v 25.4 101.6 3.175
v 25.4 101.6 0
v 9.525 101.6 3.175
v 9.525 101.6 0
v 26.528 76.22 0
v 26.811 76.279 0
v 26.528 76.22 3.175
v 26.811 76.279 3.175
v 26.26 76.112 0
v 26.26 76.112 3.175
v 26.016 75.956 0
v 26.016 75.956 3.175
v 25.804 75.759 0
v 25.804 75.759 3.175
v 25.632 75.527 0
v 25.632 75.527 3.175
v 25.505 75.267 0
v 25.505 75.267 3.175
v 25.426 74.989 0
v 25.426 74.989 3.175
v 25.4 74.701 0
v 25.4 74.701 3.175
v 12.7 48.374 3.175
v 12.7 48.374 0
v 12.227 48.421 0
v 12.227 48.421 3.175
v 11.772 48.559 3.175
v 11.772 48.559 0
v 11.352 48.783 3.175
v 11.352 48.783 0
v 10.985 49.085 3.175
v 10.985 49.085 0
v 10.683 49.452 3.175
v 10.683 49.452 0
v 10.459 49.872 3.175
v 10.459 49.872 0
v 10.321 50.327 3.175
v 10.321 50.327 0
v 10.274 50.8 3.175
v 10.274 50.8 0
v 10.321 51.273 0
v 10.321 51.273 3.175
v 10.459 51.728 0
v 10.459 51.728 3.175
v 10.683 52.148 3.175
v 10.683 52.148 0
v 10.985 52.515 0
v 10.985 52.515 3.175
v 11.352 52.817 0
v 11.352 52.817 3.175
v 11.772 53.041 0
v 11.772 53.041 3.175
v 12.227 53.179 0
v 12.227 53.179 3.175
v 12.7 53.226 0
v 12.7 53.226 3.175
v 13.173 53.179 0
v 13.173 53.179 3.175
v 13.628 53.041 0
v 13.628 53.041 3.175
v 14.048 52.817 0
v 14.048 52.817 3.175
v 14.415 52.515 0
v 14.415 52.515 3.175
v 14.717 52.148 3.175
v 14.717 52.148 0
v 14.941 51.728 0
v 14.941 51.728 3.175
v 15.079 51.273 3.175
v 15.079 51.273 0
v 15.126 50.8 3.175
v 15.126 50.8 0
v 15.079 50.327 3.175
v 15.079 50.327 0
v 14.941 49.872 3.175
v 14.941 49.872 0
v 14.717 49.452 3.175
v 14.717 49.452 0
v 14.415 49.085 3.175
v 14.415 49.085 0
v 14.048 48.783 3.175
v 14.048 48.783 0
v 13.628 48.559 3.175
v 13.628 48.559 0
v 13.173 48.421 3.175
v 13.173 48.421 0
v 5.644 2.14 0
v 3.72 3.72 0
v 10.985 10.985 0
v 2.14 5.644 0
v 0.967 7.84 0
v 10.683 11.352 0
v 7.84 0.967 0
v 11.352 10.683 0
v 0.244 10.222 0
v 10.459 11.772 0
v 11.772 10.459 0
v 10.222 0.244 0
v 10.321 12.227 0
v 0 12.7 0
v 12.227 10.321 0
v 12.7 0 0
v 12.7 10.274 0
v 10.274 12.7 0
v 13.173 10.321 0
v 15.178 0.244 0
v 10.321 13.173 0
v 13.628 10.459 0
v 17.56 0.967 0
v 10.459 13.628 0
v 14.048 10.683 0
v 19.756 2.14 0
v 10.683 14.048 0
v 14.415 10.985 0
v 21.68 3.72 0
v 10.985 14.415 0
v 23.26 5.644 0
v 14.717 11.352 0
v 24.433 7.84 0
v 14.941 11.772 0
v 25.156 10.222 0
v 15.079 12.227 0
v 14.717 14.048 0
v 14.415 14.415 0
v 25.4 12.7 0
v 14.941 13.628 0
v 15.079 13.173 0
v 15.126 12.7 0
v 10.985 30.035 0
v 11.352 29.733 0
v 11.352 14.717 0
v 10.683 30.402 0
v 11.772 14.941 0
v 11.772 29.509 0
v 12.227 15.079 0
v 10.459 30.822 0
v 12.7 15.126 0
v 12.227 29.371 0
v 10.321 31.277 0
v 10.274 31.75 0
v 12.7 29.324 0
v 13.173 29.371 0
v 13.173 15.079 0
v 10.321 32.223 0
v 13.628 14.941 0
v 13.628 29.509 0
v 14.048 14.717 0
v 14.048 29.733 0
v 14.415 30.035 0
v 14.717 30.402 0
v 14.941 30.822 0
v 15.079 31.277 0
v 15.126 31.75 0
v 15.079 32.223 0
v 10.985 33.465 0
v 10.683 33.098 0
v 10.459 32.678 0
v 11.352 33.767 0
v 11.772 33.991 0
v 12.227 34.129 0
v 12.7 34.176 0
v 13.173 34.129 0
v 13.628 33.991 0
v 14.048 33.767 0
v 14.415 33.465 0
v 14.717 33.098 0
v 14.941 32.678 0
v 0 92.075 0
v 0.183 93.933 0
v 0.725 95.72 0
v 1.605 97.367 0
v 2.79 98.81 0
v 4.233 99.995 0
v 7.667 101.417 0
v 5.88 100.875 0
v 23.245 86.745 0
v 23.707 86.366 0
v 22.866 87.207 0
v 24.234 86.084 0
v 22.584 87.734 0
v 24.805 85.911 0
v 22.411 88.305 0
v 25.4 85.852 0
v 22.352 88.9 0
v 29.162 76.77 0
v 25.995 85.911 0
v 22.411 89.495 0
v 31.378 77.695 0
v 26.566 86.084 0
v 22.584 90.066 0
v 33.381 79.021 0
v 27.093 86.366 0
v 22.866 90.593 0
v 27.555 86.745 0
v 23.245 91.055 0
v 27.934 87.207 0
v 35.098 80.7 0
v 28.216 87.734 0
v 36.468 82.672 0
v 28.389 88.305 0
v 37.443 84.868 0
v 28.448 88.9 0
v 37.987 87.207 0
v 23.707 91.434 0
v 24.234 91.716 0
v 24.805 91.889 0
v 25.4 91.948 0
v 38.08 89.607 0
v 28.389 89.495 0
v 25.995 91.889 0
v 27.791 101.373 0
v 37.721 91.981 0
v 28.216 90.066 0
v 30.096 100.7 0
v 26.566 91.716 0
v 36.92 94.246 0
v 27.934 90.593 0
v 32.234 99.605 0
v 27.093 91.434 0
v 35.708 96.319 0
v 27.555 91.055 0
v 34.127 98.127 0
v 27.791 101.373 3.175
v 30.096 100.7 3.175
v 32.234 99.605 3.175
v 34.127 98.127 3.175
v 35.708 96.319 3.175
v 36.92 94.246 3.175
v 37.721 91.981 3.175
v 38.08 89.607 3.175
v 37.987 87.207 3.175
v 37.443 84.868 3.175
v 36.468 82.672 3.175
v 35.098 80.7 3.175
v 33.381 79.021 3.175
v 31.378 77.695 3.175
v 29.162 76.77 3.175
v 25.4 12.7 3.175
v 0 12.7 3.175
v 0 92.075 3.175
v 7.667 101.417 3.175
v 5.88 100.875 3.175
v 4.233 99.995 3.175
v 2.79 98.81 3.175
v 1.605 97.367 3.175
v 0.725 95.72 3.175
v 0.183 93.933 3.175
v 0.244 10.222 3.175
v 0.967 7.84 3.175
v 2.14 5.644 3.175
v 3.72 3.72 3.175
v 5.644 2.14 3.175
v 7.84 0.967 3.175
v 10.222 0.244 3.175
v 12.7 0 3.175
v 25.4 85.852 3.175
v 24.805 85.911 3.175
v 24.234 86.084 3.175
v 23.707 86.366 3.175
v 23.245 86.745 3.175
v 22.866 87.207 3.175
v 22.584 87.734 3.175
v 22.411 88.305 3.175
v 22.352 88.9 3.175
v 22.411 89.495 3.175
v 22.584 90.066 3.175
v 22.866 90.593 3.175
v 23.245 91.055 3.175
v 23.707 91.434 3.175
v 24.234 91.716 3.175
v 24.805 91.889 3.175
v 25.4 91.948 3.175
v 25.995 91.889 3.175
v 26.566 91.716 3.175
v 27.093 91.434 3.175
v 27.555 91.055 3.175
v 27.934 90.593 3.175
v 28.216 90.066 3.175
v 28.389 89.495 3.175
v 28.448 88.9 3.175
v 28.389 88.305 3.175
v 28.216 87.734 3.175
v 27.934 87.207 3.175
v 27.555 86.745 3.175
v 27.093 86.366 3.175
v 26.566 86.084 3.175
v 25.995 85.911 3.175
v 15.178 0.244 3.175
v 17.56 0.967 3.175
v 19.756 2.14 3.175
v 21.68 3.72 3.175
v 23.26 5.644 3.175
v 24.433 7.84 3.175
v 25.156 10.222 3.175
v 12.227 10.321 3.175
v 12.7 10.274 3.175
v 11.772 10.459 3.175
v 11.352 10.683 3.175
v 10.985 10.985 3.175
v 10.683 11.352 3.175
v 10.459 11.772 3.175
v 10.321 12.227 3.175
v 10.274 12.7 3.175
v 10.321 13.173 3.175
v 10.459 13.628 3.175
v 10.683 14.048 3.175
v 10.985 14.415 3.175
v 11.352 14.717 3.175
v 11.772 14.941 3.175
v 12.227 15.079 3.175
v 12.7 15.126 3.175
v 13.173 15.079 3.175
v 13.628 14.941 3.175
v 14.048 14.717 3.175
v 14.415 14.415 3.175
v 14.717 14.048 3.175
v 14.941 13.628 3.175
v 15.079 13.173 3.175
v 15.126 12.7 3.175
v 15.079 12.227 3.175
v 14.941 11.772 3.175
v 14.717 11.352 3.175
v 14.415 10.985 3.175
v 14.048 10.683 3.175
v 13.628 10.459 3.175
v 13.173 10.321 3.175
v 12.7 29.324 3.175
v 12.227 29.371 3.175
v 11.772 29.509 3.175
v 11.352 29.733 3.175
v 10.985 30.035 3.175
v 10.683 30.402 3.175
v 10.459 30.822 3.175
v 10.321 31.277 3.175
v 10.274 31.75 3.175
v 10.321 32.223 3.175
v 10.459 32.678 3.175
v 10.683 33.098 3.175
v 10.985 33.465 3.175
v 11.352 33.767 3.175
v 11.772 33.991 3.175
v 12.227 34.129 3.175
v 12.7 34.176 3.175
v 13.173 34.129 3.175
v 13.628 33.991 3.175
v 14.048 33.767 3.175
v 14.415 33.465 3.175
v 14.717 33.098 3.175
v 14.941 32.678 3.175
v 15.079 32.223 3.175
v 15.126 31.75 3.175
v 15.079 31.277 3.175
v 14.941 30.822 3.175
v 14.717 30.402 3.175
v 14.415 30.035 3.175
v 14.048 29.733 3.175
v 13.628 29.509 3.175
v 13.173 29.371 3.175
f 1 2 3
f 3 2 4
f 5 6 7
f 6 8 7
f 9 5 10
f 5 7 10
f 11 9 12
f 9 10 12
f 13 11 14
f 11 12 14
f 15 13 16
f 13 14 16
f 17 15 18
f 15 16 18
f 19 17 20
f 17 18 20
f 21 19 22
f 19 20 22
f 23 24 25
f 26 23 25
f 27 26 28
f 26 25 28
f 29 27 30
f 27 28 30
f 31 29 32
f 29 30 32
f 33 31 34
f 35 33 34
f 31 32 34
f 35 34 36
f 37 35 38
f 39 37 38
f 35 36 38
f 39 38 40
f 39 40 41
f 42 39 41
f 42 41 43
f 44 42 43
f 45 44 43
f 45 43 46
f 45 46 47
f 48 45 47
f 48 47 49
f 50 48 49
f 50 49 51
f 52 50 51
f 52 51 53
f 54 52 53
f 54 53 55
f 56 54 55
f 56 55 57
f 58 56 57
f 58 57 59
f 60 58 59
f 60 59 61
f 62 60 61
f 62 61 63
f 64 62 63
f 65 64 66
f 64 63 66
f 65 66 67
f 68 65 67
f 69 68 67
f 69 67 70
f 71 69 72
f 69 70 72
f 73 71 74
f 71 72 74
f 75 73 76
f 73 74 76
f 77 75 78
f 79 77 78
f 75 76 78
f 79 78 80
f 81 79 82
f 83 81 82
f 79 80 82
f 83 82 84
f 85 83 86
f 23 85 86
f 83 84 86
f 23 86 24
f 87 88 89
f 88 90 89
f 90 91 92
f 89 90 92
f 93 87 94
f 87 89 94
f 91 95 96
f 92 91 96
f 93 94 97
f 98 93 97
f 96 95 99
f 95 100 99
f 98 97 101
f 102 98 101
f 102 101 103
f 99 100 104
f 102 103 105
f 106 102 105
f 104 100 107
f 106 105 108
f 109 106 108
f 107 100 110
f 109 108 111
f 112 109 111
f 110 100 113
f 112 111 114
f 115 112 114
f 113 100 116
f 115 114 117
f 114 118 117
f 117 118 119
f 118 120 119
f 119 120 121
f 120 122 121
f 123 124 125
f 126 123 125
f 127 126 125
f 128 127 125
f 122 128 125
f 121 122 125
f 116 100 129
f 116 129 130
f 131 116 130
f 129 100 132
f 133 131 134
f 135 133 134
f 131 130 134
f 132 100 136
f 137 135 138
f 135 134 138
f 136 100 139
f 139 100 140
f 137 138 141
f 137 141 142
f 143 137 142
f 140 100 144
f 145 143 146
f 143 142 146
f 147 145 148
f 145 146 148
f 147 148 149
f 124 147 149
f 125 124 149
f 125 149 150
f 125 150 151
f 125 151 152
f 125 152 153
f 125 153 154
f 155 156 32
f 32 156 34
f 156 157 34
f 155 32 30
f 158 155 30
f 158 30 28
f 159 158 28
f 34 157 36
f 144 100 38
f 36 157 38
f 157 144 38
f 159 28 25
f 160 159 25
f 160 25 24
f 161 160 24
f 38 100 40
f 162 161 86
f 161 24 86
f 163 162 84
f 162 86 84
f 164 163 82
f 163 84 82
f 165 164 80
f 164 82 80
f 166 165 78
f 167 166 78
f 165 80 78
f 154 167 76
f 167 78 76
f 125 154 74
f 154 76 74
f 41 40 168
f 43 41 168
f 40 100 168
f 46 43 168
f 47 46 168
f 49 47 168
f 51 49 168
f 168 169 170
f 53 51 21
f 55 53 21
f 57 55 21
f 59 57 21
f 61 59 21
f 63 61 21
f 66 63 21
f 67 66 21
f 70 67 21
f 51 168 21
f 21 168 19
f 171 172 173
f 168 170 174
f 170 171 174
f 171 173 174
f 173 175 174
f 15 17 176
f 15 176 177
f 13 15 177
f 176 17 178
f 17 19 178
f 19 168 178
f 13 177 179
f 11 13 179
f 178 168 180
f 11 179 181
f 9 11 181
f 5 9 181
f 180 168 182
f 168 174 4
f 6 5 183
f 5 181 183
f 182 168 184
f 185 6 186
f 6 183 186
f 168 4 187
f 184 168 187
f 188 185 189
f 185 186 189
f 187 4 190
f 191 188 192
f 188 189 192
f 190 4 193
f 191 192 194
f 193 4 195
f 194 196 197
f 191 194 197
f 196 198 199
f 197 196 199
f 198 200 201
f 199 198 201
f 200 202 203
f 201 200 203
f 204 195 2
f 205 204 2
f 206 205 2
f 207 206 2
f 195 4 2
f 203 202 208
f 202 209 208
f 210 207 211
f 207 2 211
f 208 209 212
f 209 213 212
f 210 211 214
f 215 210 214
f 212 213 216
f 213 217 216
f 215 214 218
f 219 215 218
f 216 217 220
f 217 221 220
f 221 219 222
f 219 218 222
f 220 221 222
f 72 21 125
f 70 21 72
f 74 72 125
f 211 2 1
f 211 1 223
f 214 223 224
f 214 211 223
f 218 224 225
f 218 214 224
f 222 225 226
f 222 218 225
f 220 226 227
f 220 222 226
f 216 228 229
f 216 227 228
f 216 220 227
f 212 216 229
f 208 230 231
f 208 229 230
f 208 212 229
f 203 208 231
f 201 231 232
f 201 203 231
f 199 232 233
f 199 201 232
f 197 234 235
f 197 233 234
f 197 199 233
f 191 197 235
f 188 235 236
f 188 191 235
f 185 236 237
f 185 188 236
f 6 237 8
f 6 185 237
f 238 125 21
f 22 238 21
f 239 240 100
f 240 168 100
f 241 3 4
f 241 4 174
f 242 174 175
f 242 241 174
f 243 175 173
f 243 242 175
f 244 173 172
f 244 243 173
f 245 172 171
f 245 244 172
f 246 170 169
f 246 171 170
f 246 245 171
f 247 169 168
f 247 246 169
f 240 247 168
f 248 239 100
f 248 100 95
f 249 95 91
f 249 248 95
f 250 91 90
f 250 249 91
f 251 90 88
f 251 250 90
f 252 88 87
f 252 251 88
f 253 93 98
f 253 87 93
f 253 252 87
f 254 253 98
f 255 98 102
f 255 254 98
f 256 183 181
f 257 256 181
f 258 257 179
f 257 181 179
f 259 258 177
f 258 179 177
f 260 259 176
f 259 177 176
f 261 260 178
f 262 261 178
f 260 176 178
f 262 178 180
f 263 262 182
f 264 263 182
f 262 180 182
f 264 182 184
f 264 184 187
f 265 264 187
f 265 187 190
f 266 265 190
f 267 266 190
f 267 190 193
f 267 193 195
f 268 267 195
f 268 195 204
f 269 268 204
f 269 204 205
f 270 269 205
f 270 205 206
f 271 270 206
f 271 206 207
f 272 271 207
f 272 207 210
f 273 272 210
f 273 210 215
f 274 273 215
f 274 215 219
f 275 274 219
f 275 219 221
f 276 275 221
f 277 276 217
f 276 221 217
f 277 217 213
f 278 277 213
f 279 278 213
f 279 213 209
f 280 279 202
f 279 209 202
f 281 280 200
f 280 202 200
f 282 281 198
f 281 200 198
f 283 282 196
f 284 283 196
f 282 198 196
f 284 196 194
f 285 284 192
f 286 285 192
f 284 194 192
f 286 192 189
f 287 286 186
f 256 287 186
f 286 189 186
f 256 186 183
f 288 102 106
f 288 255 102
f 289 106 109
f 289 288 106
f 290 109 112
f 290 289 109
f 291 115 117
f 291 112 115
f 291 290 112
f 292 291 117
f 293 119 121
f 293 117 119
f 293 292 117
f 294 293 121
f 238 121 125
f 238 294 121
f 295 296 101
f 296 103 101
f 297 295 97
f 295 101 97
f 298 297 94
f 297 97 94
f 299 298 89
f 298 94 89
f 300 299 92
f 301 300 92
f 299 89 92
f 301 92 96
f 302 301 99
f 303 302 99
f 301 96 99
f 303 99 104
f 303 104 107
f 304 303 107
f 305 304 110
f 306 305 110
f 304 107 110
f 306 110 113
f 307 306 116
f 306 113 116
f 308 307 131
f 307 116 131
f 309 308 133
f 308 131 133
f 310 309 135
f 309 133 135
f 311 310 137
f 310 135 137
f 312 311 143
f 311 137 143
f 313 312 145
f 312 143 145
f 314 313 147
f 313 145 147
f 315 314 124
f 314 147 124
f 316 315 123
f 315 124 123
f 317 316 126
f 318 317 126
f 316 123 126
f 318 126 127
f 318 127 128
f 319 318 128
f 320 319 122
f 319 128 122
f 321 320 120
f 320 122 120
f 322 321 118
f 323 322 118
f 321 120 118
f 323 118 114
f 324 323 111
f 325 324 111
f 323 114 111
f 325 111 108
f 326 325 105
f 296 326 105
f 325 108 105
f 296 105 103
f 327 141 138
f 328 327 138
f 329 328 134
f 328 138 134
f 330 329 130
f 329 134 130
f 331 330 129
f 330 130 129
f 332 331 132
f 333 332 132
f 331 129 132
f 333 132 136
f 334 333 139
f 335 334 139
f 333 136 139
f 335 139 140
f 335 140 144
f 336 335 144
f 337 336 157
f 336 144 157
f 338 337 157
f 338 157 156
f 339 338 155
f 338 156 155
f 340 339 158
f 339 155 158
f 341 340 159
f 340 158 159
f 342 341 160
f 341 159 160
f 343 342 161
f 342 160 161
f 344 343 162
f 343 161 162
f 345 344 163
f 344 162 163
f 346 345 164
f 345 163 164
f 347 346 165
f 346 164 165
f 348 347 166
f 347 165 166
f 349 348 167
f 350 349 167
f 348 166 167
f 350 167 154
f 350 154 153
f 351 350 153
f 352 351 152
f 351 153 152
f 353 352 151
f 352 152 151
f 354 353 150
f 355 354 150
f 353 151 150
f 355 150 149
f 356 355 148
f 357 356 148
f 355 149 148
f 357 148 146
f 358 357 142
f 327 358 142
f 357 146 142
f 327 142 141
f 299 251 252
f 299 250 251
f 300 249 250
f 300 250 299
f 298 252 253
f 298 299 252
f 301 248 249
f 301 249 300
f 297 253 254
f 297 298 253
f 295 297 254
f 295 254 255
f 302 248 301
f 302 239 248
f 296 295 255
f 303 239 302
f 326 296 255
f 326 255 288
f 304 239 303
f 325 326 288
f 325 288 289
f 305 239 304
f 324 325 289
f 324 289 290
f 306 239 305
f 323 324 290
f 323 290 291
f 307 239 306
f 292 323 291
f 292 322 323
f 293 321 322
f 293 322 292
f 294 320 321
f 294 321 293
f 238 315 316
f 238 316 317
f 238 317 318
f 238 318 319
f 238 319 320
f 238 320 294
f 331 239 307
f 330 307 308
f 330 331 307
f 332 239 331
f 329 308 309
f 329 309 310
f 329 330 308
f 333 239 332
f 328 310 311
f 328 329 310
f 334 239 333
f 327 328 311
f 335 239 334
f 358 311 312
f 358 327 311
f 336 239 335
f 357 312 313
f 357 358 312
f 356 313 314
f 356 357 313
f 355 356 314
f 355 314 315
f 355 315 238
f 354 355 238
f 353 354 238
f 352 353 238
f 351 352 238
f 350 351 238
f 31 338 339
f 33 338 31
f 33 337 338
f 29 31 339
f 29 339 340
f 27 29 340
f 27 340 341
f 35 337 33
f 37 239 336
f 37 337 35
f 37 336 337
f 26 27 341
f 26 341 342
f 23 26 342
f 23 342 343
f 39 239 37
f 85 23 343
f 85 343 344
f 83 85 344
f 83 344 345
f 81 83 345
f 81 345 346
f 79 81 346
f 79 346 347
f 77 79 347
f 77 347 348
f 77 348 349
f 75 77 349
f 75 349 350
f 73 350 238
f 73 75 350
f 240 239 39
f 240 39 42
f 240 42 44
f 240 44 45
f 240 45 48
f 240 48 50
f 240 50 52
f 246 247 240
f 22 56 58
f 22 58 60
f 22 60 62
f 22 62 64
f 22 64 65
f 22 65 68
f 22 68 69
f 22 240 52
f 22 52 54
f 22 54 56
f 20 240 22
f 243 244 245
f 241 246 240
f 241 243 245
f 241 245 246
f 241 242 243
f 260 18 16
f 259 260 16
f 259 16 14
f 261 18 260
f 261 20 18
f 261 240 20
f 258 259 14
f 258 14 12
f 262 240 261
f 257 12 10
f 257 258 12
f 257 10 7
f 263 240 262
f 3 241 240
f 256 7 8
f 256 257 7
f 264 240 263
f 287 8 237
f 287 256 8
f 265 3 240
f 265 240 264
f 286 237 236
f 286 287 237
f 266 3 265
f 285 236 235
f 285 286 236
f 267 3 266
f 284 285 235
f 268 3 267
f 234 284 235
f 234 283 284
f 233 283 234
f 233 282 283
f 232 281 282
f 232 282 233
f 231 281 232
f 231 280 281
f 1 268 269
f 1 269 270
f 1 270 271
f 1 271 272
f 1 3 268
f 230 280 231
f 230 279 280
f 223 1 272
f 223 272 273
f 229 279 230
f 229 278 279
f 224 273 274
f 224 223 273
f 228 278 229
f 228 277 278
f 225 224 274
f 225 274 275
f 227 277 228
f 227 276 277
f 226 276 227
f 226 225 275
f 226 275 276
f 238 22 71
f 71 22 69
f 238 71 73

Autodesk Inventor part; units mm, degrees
ref_plane "YZ Plane" through (0, 0, 0) normal (1, 0, 0) x (0, 1, 0)
ref_plane "XZ Plane" through (0, 0, 0) normal (0, 1, 0) x (-1, 0, 0)
ref_plane "XY Plane" through (0, 0, 0) normal (0, 0, 1) x (1, 0, 0)
sketch "Sketch1" plane through (0, 0, 0) normal (0, 0, 1) x (1, 0, 0)
  line L0 (0, 0) -> (25.4, 0)
  line L1 (25.4, 0) -> (25.4, 101.6)
  line L2 (25.4, 101.6) -> (0, 101.6)
  line L3 (0, 101.6) -> (0, 0)
  arc A0 (25.4, 76.2) -> (25.4, 101.6) centre (25.4, 88.9) ccw
  dimension "d0" = 101.6
  dimension "d1" = 25.4
  dimension "d2" = 25.4
extrude "Extrusion1" add sketch "Sketch1" along normal blind 3.175
sketch "Sketch3" plane through (0, 0, 3.175) normal (0, 0, 1) x (1, 0, 0)
  line L0 (0, 101.6) -> (0, 0) projected
  line L1 (0, 0) -> (25.4, 0) projected
  line L2 (25.4, 101.6) -> (0, 101.6) projected
  line L3 (25.4, 0) -> (25.4, 76.2) projected
  line L4 (0, 0) -> (25.4, 0)
  line L5 (25.4, 0) -> (25.4, 63.5)
  line L6 (25.4, 63.5) -> (0, 63.5)
  line L7 (0, 63.5) -> (0, 0)
  point P0 (12.7, 50.8)
  point P1 (12.7, 12.7)
  point P2 (12.7, 31.75)
  point P3 (12.7, 0)
  dimension "d50" = 12.7
  dimension "d53" = 38.1
  dimension "d54" = 63.5
  dimension "d55" = 19.05
hole "Hole1" at (12.7, 50.8, 3.175) at (12.7, 12.7, 3.175) at (12.7, 31.75, 3.175) direction (0, 0, -1) diameter 4.8514 end through all
sketch "Sketch4" plane through (0, 0, 3.175) normal (0, 0, 1) x (1, 0, 0)
  line L0 (25.4, 0) -> (25.4, 76.2) projected
  arc A0 (25.4, 76.2) -> (25.4, 101.6) centre (25.4, 88.9) ccw projected
  point P0 (0, 0)
hole "Hole2" at (25.4, 88.9, 3.175) direction (0, 0, -1) diameter 6.096 end through all clearance for "Flat Head Machine Screw (82)" size "#12" standard "Ansi Unified Screw Threads"
fillet "Fillet1" radius 9.525 1 edges at (0, 101.6, 1.5875)
fillet "Fillet2" radius 1.5875 1 edges at (25.4, 76.2, 1.5875)
fillet "Fillet3" radius 12.7 2 edges at (25.4, 0, 1.5875) (0, 0, 1.5875)
equation "\"d2\" = d1"
properties part number "CLB_027_LifterBracket.ipt" material "Aluminum 6061"
